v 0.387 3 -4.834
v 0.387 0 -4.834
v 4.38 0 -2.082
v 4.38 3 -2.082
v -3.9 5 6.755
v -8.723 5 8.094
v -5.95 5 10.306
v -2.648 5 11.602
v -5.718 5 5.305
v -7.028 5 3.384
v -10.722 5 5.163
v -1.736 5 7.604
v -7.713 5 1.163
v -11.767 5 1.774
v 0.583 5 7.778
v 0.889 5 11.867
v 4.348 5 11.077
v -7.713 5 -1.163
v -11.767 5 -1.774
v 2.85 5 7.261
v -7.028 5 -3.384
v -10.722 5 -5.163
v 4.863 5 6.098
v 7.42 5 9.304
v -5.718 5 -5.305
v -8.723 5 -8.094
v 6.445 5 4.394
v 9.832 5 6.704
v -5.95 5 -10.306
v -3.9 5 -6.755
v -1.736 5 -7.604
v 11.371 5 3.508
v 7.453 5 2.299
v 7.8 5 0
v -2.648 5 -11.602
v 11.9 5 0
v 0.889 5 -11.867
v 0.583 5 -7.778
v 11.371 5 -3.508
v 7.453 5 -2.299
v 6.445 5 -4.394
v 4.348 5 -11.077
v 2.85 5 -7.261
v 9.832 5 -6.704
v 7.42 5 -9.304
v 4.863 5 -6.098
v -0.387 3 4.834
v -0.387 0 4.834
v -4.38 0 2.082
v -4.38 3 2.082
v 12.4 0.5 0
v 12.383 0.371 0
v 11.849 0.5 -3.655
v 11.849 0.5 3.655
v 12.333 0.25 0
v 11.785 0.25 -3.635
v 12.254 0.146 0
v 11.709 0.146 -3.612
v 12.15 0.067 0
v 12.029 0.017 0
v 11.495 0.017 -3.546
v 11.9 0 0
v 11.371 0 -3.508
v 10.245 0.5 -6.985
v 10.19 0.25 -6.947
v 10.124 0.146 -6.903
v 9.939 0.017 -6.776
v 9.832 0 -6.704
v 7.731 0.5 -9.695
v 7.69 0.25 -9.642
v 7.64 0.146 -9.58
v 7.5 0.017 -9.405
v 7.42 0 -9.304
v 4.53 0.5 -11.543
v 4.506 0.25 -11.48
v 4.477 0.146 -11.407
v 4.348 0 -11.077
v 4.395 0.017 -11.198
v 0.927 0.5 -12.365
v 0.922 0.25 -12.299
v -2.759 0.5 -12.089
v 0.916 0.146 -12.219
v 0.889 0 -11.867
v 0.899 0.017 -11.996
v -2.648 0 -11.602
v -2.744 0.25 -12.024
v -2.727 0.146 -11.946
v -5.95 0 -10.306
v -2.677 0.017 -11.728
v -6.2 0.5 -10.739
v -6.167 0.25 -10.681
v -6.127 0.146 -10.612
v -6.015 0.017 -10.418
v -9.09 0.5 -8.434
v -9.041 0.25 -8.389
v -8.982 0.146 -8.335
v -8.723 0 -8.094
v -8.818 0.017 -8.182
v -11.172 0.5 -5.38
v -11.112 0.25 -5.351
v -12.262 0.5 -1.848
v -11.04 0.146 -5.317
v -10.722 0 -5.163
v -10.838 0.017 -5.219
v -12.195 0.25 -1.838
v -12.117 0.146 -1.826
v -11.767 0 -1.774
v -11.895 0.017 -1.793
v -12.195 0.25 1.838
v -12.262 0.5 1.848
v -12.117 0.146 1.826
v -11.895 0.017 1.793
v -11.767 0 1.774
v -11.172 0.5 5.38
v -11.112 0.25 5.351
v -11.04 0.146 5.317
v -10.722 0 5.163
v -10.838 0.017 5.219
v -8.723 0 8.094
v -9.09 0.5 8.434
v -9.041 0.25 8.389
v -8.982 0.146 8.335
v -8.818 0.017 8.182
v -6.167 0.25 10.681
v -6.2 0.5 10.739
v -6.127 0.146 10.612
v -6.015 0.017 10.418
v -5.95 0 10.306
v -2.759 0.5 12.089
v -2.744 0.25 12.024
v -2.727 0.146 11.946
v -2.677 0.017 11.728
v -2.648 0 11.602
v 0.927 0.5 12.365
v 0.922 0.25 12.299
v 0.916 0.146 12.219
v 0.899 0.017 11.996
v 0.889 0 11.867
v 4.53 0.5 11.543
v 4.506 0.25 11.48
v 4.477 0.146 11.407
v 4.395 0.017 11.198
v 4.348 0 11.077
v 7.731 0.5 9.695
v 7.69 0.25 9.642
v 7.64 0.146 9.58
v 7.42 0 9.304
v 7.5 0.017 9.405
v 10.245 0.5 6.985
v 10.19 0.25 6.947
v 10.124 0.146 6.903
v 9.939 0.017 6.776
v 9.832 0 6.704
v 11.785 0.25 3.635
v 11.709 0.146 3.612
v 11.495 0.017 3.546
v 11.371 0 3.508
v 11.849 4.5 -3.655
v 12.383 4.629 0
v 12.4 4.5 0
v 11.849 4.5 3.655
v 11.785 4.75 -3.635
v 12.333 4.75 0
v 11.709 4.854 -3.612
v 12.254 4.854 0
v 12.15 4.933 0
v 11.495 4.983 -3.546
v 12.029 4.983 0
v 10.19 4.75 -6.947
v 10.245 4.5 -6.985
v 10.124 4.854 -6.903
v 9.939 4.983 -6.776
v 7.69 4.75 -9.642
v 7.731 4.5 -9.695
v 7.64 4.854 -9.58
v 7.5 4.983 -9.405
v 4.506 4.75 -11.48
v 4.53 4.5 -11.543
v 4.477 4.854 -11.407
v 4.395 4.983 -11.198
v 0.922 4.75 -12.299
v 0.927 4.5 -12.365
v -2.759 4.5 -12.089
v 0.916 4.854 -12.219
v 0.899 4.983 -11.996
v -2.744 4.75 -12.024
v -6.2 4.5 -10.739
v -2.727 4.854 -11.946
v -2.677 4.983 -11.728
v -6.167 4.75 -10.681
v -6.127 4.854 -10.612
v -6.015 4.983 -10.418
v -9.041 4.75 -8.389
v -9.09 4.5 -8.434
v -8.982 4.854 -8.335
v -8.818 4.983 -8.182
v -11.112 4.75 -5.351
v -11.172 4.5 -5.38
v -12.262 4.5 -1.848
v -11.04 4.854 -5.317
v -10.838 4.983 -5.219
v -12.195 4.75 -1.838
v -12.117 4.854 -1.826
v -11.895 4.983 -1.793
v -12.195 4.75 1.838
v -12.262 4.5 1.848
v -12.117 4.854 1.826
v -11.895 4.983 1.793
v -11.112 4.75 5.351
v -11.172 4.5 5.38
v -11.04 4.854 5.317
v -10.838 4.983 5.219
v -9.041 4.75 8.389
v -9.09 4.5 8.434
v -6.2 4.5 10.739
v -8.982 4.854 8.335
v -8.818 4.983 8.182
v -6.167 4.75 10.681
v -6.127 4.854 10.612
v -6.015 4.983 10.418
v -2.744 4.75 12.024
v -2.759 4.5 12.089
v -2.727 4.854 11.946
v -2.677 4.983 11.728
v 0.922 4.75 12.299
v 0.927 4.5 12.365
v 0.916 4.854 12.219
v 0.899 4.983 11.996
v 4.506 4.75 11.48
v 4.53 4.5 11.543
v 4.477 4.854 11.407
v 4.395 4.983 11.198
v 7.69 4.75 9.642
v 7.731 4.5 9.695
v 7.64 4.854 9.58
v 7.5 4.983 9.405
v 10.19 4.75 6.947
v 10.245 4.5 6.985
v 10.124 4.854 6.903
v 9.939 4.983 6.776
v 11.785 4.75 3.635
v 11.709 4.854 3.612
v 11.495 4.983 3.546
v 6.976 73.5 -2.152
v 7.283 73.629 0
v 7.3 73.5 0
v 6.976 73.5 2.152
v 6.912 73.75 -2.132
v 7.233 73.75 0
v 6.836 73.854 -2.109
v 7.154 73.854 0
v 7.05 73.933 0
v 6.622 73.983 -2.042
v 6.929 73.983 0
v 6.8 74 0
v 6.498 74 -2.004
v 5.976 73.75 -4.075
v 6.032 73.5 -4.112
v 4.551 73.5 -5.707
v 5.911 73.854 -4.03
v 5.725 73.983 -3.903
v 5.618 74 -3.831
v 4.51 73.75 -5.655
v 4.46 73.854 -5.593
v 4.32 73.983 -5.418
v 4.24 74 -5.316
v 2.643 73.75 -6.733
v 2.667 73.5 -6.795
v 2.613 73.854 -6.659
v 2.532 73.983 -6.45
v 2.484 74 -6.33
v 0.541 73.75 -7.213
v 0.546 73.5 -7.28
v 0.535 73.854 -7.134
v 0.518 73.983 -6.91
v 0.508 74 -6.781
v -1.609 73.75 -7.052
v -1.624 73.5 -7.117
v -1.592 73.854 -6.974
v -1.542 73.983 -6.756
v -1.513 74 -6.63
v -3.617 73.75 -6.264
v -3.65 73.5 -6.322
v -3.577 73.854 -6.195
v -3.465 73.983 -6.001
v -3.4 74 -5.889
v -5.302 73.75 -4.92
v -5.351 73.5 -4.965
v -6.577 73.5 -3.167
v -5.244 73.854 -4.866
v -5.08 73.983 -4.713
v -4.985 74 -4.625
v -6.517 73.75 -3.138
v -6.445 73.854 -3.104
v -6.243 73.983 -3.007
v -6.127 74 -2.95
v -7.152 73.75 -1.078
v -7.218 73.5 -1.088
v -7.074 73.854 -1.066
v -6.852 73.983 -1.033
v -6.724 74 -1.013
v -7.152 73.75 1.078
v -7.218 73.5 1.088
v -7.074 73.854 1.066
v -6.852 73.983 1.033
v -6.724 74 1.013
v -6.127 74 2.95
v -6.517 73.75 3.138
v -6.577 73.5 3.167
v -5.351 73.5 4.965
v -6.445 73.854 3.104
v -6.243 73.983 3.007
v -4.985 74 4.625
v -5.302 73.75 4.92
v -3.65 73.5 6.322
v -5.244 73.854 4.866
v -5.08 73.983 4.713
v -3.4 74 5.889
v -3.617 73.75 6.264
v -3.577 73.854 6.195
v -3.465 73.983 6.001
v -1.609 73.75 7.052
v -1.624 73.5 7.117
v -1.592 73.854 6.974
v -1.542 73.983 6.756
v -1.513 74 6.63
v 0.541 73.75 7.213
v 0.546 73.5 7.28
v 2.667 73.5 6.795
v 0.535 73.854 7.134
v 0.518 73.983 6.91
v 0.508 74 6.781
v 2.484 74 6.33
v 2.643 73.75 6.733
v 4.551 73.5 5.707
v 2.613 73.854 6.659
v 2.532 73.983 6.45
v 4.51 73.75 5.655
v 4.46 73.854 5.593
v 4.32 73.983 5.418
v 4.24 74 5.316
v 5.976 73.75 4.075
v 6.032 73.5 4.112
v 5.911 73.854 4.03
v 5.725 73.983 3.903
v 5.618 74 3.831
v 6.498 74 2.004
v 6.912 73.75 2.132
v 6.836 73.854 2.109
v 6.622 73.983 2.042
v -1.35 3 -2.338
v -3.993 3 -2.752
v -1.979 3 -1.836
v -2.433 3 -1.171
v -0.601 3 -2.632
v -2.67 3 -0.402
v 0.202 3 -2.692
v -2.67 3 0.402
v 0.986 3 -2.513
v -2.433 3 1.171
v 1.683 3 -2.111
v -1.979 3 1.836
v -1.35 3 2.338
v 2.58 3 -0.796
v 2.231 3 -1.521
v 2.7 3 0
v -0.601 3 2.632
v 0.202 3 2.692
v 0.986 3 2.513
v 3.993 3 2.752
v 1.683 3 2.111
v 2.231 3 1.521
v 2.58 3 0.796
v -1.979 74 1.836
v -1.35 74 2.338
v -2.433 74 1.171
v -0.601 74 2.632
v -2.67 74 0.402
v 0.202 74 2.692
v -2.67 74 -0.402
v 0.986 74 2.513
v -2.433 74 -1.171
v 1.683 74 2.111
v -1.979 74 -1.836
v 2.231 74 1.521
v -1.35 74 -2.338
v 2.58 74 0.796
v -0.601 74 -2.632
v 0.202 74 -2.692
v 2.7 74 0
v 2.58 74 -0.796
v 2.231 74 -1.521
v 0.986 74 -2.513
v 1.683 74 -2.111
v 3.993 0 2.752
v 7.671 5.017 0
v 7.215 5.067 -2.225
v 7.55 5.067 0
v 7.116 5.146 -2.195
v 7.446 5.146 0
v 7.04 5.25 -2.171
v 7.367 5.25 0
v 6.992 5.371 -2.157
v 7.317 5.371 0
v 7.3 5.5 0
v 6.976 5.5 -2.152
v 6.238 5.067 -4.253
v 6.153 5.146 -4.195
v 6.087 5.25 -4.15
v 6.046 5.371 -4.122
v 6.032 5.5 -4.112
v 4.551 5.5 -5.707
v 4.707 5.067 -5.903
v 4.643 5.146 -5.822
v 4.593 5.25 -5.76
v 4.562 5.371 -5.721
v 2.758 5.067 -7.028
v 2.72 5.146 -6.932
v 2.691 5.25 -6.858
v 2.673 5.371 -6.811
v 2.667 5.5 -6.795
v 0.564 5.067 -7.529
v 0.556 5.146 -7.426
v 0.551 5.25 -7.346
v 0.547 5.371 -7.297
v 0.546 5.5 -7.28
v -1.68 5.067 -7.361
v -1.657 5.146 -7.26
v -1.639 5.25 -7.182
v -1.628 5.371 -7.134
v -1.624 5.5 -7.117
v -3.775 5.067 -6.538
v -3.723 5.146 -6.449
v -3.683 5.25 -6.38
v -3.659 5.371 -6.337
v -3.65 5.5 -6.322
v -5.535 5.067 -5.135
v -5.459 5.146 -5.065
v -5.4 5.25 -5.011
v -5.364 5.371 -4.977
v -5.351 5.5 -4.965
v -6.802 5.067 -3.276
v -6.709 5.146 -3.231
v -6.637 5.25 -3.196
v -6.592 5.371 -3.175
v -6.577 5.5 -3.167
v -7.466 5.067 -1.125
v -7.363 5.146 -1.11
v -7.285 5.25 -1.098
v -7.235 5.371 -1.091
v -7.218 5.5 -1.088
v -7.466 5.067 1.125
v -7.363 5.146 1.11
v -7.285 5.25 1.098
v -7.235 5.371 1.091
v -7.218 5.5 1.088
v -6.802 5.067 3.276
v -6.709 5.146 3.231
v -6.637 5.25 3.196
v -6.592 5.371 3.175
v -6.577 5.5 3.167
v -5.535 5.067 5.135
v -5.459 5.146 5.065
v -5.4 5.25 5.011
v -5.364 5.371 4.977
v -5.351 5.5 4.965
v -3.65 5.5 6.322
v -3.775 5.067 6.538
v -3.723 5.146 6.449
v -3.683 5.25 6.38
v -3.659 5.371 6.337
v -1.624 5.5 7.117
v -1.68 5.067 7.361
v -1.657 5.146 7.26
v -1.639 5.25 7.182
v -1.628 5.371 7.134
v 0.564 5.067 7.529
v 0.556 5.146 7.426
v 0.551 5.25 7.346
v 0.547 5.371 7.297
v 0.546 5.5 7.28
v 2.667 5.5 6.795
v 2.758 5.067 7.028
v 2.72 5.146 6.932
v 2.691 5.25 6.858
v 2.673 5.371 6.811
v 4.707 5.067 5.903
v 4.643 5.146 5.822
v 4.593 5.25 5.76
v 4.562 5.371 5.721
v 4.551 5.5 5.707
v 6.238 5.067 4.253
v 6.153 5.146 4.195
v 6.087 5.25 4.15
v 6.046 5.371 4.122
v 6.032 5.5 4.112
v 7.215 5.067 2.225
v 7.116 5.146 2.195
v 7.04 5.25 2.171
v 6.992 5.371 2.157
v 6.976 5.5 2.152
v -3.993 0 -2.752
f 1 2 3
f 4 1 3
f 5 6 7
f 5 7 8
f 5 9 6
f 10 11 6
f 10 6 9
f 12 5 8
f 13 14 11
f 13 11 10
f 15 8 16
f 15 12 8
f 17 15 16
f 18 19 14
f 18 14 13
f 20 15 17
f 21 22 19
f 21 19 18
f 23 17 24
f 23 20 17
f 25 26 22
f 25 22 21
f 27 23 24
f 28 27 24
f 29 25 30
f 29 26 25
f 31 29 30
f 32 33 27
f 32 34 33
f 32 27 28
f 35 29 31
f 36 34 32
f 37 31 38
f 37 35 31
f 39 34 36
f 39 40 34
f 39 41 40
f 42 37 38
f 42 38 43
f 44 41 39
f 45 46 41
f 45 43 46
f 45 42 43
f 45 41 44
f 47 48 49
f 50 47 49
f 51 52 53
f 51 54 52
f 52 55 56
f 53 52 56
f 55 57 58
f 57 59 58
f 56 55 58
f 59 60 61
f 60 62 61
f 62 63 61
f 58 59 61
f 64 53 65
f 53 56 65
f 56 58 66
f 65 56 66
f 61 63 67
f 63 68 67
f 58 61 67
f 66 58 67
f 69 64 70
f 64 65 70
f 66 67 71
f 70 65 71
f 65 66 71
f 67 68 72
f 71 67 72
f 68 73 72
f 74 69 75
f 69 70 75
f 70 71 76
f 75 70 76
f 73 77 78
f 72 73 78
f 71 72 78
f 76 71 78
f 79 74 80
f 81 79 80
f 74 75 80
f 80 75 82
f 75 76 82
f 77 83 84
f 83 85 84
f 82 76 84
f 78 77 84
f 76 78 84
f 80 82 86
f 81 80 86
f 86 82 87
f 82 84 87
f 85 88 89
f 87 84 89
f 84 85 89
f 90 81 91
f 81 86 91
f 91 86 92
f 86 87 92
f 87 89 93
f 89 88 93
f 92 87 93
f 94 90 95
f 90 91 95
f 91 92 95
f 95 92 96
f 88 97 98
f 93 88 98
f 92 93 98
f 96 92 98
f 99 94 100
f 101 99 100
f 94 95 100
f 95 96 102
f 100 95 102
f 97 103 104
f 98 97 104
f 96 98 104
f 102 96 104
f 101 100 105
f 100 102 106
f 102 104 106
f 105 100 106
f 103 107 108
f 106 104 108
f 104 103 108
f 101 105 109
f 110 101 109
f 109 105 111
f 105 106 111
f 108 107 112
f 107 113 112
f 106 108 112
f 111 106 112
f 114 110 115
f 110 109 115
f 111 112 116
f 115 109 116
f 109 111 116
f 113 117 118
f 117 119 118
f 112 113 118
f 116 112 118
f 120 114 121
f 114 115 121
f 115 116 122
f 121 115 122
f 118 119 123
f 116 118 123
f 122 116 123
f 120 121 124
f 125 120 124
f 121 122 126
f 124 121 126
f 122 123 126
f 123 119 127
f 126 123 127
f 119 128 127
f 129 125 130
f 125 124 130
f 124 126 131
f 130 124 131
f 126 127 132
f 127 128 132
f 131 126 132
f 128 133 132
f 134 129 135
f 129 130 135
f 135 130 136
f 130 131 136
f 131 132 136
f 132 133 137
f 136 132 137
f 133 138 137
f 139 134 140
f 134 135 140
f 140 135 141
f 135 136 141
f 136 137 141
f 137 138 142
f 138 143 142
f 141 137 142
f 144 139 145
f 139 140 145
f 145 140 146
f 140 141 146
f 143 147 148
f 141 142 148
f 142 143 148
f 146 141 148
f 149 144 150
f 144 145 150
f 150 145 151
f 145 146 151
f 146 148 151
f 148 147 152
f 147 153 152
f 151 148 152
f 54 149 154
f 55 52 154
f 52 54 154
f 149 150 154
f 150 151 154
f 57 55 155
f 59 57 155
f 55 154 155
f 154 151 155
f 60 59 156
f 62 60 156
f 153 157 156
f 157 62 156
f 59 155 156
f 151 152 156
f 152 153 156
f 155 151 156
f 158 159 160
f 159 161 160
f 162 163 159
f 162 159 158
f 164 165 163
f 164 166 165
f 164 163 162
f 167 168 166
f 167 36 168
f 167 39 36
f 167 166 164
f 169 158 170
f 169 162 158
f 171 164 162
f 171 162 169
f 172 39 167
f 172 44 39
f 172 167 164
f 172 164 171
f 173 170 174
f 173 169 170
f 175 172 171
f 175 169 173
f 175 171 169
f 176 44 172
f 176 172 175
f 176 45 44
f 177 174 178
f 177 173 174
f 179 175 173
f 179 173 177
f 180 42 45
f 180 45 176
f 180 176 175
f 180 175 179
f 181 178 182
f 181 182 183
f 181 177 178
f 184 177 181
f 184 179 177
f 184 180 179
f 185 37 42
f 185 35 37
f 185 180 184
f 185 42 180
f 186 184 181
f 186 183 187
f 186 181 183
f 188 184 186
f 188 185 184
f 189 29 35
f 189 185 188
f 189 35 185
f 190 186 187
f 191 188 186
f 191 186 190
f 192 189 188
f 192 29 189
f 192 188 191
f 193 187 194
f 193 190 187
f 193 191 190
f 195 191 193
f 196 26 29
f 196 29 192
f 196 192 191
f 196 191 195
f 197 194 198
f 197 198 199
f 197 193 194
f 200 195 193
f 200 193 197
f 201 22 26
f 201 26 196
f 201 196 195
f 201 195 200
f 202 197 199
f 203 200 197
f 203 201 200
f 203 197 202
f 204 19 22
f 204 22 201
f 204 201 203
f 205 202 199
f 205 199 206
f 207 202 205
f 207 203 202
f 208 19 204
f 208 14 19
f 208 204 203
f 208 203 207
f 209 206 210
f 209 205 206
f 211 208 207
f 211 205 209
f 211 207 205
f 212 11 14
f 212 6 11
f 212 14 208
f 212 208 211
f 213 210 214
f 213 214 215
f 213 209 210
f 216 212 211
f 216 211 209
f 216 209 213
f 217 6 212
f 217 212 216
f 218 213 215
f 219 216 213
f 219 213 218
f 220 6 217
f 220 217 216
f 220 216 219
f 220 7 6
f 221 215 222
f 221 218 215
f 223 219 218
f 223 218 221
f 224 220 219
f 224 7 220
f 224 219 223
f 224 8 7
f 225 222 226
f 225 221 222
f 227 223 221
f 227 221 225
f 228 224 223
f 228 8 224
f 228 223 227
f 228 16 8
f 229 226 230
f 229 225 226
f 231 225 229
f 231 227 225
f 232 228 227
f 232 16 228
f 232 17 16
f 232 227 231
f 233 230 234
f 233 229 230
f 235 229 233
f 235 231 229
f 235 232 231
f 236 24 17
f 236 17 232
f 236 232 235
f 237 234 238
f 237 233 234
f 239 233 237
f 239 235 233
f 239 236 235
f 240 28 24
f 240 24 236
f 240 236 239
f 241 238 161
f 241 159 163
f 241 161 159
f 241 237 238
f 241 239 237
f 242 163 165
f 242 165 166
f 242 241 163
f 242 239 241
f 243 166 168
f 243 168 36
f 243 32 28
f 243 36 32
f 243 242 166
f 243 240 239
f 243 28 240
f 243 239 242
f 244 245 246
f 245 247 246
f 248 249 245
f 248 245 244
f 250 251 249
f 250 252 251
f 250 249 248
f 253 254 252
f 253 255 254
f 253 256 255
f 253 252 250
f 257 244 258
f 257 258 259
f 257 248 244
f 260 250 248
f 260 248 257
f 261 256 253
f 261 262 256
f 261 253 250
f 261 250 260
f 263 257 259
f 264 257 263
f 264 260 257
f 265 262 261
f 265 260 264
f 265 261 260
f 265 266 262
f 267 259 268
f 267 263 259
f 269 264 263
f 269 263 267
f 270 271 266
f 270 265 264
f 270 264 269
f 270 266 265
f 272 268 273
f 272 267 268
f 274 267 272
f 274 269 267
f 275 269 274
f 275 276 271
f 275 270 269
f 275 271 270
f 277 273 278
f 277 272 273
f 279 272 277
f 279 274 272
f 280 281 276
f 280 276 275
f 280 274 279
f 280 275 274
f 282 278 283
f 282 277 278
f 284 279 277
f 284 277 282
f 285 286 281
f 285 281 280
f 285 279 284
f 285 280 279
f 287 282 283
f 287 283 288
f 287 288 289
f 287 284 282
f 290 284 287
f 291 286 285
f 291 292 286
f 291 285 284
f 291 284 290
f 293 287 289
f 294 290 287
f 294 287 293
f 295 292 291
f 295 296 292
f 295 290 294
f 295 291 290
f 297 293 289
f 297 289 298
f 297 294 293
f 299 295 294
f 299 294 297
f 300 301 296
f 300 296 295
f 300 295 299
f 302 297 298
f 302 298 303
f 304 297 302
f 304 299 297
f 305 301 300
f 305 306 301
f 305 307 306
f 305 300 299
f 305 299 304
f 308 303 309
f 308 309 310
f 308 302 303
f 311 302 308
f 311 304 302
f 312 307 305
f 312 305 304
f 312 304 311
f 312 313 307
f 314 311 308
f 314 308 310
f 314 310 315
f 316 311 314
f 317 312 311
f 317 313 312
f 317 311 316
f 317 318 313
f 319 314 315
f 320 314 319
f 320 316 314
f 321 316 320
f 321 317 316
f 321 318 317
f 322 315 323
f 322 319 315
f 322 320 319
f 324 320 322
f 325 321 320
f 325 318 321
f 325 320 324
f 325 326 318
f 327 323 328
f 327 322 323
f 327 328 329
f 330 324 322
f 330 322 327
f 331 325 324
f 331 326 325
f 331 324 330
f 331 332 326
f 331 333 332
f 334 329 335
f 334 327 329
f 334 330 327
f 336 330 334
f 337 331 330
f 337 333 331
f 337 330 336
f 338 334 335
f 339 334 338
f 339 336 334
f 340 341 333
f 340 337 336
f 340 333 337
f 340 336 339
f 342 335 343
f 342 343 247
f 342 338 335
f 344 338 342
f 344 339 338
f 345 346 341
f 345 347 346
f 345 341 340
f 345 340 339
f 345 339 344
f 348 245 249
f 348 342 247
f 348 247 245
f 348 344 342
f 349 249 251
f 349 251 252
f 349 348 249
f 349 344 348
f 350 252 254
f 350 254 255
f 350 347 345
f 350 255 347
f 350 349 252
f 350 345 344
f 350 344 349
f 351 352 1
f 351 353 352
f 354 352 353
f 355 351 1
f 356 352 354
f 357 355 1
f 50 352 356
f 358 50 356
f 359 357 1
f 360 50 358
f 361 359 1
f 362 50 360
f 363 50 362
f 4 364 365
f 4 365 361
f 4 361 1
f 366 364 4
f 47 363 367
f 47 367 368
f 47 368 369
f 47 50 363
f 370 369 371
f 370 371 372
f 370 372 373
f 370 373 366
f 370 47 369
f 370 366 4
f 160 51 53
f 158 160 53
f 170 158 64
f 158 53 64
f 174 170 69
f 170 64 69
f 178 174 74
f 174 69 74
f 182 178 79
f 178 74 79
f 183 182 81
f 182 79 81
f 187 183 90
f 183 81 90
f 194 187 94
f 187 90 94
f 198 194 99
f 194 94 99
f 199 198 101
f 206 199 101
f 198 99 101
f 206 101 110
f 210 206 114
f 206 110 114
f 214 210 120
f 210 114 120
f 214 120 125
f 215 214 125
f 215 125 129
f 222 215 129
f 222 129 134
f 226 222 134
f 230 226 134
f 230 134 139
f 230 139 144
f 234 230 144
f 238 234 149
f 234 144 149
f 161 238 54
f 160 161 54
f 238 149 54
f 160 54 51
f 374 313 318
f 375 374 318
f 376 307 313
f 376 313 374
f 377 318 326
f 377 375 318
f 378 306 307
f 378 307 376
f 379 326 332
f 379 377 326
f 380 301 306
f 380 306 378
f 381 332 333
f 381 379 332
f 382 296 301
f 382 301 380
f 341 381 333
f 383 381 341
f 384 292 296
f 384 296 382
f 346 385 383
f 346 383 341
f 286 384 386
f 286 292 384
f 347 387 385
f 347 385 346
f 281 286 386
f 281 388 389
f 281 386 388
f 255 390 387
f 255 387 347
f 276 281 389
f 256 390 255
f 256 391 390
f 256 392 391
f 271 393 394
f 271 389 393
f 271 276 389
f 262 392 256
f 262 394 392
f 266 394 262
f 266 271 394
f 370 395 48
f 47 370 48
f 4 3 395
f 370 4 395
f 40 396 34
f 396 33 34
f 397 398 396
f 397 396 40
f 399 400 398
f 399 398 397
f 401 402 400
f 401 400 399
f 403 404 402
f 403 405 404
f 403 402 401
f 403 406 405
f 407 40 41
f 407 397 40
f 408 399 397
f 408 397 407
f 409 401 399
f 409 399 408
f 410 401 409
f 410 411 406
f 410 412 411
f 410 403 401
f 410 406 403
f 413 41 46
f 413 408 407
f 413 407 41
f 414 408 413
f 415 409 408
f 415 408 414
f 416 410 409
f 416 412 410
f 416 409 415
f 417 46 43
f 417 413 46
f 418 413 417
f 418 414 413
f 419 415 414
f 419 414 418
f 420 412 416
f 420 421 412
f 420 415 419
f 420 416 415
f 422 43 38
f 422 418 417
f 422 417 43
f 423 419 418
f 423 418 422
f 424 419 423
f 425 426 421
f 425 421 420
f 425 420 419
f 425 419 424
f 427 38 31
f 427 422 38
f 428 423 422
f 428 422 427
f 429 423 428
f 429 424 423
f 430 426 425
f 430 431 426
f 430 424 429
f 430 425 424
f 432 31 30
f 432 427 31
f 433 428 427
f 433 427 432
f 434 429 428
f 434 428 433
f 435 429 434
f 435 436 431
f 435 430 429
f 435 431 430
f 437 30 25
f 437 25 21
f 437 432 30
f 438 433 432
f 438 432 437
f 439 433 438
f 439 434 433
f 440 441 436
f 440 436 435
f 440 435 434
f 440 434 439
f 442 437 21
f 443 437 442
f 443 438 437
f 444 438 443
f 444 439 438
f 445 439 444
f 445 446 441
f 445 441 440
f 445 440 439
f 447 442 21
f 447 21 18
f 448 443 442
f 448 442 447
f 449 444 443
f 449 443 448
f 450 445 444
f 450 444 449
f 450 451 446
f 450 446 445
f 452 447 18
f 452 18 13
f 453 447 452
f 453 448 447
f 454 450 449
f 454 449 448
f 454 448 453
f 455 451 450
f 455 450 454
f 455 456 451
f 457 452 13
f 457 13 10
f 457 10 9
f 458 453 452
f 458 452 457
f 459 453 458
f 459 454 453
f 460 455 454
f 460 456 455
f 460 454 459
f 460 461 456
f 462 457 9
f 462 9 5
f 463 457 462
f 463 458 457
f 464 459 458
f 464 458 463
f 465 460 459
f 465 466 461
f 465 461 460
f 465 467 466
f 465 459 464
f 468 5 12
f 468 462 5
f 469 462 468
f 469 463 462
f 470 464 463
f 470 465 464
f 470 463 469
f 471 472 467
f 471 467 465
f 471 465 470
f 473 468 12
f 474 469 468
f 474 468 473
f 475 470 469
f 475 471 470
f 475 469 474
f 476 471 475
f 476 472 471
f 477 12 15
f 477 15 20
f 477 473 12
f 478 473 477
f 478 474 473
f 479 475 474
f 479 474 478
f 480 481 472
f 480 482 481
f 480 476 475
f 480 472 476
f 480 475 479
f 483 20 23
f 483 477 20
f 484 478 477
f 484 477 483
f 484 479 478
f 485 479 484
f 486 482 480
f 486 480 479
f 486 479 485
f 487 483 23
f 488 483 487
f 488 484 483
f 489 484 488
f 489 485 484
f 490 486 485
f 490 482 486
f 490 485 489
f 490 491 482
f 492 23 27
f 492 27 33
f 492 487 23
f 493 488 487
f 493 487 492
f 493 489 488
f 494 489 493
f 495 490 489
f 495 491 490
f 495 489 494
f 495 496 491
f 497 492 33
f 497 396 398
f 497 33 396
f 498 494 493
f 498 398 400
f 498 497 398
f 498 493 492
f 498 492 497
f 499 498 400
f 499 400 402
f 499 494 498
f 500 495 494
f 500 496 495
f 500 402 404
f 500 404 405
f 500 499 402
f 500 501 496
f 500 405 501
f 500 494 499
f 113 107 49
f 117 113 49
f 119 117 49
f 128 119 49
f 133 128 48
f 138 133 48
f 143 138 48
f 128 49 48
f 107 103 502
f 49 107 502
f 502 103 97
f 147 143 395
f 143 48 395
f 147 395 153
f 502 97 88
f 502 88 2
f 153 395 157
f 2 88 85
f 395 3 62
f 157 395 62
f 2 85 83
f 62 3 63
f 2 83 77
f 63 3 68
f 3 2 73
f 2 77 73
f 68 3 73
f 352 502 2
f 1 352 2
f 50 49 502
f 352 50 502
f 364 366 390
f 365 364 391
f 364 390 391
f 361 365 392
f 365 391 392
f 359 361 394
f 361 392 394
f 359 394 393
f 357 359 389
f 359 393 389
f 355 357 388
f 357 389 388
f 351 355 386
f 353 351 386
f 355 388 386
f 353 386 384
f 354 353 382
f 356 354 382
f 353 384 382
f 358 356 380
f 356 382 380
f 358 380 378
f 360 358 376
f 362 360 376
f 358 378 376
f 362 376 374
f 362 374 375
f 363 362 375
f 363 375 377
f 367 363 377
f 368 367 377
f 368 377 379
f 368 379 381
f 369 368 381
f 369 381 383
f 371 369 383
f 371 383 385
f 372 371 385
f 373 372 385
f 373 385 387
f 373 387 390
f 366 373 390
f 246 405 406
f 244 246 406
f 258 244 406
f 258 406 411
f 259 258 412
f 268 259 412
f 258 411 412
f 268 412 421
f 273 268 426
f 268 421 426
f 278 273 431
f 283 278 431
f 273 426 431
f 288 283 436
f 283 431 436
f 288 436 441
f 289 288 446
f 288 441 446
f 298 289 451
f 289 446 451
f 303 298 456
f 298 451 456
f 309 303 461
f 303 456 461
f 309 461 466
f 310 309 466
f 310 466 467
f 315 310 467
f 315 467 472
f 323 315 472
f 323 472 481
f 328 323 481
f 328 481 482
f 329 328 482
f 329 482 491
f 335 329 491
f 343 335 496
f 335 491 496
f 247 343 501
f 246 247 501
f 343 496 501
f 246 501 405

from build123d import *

# Parameters (mm, degrees)
SKETCH1_R           = 12.4
BOSS_EXTRUDE1_DEPTH = 5
SKETCH2_R           = 7.3
BOSS_EXTRUDE2_DEPTH = 69
SKETCH3_R           = 2.7
CUT_EXTRUDE1_DEPTH  = 75
CUT_EXTRUDE2_DEPTH  = 3
FILLET1_R           = 0.5


with BuildPart() as part:
    # Sketch1 → Boss-Extrude1 (new body)
    with BuildSketch(Plane(origin=(0, 0, 0), x_dir=(1, 0, 0), z_dir=(0, 1, 0))):
        Circle(SKETCH1_R)
    extrude(amount=BOSS_EXTRUDE1_DEPTH)

    # Sketch2 → Boss-Extrude2 (add)
    with BuildSketch(Plane(origin=(0, 5, 0), x_dir=(1, 0, 0), z_dir=(0, 1, 0))):
        Circle(SKETCH2_R)
    extrude(amount=BOSS_EXTRUDE2_DEPTH)

    # Sketch3 → Cut-Extrude1 (cut, through all)
    with BuildSketch(Plane(origin=(0, 74, 0), x_dir=(1, 0, 0), z_dir=(0, 1, 0))):
        Circle(SKETCH3_R)
    extrude(amount=-CUT_EXTRUDE1_DEPTH, mode=Mode.SUBTRACT)

    # Sketch4 → Cut-Extrude2 (cut)
    with BuildSketch(Plane.XZ):
        Polygon((-4.38019792, 2.081793981), (-3.992985433, -2.752465682), (0.387212487, -4.834259663), (4.38019792, -2.081793981), (3.992985433, 2.752465682), (-0.387212487, 4.834259663), align=None)
    extrude(amount=-CUT_EXTRUDE2_DEPTH, mode=Mode.SUBTRACT)

    # Fillet1
    fillet1_edges = [part.edges().sort_by_distance(p)[0] for p in [
        (-12.4, 0, 0),
        (-12.4, 5, 0),
        (-7.3, 5, 0),
        (-7.3, 74, 0),
    ]]
    fillet(fillet1_edges, radius=FILLET1_R)


solid = part.part
